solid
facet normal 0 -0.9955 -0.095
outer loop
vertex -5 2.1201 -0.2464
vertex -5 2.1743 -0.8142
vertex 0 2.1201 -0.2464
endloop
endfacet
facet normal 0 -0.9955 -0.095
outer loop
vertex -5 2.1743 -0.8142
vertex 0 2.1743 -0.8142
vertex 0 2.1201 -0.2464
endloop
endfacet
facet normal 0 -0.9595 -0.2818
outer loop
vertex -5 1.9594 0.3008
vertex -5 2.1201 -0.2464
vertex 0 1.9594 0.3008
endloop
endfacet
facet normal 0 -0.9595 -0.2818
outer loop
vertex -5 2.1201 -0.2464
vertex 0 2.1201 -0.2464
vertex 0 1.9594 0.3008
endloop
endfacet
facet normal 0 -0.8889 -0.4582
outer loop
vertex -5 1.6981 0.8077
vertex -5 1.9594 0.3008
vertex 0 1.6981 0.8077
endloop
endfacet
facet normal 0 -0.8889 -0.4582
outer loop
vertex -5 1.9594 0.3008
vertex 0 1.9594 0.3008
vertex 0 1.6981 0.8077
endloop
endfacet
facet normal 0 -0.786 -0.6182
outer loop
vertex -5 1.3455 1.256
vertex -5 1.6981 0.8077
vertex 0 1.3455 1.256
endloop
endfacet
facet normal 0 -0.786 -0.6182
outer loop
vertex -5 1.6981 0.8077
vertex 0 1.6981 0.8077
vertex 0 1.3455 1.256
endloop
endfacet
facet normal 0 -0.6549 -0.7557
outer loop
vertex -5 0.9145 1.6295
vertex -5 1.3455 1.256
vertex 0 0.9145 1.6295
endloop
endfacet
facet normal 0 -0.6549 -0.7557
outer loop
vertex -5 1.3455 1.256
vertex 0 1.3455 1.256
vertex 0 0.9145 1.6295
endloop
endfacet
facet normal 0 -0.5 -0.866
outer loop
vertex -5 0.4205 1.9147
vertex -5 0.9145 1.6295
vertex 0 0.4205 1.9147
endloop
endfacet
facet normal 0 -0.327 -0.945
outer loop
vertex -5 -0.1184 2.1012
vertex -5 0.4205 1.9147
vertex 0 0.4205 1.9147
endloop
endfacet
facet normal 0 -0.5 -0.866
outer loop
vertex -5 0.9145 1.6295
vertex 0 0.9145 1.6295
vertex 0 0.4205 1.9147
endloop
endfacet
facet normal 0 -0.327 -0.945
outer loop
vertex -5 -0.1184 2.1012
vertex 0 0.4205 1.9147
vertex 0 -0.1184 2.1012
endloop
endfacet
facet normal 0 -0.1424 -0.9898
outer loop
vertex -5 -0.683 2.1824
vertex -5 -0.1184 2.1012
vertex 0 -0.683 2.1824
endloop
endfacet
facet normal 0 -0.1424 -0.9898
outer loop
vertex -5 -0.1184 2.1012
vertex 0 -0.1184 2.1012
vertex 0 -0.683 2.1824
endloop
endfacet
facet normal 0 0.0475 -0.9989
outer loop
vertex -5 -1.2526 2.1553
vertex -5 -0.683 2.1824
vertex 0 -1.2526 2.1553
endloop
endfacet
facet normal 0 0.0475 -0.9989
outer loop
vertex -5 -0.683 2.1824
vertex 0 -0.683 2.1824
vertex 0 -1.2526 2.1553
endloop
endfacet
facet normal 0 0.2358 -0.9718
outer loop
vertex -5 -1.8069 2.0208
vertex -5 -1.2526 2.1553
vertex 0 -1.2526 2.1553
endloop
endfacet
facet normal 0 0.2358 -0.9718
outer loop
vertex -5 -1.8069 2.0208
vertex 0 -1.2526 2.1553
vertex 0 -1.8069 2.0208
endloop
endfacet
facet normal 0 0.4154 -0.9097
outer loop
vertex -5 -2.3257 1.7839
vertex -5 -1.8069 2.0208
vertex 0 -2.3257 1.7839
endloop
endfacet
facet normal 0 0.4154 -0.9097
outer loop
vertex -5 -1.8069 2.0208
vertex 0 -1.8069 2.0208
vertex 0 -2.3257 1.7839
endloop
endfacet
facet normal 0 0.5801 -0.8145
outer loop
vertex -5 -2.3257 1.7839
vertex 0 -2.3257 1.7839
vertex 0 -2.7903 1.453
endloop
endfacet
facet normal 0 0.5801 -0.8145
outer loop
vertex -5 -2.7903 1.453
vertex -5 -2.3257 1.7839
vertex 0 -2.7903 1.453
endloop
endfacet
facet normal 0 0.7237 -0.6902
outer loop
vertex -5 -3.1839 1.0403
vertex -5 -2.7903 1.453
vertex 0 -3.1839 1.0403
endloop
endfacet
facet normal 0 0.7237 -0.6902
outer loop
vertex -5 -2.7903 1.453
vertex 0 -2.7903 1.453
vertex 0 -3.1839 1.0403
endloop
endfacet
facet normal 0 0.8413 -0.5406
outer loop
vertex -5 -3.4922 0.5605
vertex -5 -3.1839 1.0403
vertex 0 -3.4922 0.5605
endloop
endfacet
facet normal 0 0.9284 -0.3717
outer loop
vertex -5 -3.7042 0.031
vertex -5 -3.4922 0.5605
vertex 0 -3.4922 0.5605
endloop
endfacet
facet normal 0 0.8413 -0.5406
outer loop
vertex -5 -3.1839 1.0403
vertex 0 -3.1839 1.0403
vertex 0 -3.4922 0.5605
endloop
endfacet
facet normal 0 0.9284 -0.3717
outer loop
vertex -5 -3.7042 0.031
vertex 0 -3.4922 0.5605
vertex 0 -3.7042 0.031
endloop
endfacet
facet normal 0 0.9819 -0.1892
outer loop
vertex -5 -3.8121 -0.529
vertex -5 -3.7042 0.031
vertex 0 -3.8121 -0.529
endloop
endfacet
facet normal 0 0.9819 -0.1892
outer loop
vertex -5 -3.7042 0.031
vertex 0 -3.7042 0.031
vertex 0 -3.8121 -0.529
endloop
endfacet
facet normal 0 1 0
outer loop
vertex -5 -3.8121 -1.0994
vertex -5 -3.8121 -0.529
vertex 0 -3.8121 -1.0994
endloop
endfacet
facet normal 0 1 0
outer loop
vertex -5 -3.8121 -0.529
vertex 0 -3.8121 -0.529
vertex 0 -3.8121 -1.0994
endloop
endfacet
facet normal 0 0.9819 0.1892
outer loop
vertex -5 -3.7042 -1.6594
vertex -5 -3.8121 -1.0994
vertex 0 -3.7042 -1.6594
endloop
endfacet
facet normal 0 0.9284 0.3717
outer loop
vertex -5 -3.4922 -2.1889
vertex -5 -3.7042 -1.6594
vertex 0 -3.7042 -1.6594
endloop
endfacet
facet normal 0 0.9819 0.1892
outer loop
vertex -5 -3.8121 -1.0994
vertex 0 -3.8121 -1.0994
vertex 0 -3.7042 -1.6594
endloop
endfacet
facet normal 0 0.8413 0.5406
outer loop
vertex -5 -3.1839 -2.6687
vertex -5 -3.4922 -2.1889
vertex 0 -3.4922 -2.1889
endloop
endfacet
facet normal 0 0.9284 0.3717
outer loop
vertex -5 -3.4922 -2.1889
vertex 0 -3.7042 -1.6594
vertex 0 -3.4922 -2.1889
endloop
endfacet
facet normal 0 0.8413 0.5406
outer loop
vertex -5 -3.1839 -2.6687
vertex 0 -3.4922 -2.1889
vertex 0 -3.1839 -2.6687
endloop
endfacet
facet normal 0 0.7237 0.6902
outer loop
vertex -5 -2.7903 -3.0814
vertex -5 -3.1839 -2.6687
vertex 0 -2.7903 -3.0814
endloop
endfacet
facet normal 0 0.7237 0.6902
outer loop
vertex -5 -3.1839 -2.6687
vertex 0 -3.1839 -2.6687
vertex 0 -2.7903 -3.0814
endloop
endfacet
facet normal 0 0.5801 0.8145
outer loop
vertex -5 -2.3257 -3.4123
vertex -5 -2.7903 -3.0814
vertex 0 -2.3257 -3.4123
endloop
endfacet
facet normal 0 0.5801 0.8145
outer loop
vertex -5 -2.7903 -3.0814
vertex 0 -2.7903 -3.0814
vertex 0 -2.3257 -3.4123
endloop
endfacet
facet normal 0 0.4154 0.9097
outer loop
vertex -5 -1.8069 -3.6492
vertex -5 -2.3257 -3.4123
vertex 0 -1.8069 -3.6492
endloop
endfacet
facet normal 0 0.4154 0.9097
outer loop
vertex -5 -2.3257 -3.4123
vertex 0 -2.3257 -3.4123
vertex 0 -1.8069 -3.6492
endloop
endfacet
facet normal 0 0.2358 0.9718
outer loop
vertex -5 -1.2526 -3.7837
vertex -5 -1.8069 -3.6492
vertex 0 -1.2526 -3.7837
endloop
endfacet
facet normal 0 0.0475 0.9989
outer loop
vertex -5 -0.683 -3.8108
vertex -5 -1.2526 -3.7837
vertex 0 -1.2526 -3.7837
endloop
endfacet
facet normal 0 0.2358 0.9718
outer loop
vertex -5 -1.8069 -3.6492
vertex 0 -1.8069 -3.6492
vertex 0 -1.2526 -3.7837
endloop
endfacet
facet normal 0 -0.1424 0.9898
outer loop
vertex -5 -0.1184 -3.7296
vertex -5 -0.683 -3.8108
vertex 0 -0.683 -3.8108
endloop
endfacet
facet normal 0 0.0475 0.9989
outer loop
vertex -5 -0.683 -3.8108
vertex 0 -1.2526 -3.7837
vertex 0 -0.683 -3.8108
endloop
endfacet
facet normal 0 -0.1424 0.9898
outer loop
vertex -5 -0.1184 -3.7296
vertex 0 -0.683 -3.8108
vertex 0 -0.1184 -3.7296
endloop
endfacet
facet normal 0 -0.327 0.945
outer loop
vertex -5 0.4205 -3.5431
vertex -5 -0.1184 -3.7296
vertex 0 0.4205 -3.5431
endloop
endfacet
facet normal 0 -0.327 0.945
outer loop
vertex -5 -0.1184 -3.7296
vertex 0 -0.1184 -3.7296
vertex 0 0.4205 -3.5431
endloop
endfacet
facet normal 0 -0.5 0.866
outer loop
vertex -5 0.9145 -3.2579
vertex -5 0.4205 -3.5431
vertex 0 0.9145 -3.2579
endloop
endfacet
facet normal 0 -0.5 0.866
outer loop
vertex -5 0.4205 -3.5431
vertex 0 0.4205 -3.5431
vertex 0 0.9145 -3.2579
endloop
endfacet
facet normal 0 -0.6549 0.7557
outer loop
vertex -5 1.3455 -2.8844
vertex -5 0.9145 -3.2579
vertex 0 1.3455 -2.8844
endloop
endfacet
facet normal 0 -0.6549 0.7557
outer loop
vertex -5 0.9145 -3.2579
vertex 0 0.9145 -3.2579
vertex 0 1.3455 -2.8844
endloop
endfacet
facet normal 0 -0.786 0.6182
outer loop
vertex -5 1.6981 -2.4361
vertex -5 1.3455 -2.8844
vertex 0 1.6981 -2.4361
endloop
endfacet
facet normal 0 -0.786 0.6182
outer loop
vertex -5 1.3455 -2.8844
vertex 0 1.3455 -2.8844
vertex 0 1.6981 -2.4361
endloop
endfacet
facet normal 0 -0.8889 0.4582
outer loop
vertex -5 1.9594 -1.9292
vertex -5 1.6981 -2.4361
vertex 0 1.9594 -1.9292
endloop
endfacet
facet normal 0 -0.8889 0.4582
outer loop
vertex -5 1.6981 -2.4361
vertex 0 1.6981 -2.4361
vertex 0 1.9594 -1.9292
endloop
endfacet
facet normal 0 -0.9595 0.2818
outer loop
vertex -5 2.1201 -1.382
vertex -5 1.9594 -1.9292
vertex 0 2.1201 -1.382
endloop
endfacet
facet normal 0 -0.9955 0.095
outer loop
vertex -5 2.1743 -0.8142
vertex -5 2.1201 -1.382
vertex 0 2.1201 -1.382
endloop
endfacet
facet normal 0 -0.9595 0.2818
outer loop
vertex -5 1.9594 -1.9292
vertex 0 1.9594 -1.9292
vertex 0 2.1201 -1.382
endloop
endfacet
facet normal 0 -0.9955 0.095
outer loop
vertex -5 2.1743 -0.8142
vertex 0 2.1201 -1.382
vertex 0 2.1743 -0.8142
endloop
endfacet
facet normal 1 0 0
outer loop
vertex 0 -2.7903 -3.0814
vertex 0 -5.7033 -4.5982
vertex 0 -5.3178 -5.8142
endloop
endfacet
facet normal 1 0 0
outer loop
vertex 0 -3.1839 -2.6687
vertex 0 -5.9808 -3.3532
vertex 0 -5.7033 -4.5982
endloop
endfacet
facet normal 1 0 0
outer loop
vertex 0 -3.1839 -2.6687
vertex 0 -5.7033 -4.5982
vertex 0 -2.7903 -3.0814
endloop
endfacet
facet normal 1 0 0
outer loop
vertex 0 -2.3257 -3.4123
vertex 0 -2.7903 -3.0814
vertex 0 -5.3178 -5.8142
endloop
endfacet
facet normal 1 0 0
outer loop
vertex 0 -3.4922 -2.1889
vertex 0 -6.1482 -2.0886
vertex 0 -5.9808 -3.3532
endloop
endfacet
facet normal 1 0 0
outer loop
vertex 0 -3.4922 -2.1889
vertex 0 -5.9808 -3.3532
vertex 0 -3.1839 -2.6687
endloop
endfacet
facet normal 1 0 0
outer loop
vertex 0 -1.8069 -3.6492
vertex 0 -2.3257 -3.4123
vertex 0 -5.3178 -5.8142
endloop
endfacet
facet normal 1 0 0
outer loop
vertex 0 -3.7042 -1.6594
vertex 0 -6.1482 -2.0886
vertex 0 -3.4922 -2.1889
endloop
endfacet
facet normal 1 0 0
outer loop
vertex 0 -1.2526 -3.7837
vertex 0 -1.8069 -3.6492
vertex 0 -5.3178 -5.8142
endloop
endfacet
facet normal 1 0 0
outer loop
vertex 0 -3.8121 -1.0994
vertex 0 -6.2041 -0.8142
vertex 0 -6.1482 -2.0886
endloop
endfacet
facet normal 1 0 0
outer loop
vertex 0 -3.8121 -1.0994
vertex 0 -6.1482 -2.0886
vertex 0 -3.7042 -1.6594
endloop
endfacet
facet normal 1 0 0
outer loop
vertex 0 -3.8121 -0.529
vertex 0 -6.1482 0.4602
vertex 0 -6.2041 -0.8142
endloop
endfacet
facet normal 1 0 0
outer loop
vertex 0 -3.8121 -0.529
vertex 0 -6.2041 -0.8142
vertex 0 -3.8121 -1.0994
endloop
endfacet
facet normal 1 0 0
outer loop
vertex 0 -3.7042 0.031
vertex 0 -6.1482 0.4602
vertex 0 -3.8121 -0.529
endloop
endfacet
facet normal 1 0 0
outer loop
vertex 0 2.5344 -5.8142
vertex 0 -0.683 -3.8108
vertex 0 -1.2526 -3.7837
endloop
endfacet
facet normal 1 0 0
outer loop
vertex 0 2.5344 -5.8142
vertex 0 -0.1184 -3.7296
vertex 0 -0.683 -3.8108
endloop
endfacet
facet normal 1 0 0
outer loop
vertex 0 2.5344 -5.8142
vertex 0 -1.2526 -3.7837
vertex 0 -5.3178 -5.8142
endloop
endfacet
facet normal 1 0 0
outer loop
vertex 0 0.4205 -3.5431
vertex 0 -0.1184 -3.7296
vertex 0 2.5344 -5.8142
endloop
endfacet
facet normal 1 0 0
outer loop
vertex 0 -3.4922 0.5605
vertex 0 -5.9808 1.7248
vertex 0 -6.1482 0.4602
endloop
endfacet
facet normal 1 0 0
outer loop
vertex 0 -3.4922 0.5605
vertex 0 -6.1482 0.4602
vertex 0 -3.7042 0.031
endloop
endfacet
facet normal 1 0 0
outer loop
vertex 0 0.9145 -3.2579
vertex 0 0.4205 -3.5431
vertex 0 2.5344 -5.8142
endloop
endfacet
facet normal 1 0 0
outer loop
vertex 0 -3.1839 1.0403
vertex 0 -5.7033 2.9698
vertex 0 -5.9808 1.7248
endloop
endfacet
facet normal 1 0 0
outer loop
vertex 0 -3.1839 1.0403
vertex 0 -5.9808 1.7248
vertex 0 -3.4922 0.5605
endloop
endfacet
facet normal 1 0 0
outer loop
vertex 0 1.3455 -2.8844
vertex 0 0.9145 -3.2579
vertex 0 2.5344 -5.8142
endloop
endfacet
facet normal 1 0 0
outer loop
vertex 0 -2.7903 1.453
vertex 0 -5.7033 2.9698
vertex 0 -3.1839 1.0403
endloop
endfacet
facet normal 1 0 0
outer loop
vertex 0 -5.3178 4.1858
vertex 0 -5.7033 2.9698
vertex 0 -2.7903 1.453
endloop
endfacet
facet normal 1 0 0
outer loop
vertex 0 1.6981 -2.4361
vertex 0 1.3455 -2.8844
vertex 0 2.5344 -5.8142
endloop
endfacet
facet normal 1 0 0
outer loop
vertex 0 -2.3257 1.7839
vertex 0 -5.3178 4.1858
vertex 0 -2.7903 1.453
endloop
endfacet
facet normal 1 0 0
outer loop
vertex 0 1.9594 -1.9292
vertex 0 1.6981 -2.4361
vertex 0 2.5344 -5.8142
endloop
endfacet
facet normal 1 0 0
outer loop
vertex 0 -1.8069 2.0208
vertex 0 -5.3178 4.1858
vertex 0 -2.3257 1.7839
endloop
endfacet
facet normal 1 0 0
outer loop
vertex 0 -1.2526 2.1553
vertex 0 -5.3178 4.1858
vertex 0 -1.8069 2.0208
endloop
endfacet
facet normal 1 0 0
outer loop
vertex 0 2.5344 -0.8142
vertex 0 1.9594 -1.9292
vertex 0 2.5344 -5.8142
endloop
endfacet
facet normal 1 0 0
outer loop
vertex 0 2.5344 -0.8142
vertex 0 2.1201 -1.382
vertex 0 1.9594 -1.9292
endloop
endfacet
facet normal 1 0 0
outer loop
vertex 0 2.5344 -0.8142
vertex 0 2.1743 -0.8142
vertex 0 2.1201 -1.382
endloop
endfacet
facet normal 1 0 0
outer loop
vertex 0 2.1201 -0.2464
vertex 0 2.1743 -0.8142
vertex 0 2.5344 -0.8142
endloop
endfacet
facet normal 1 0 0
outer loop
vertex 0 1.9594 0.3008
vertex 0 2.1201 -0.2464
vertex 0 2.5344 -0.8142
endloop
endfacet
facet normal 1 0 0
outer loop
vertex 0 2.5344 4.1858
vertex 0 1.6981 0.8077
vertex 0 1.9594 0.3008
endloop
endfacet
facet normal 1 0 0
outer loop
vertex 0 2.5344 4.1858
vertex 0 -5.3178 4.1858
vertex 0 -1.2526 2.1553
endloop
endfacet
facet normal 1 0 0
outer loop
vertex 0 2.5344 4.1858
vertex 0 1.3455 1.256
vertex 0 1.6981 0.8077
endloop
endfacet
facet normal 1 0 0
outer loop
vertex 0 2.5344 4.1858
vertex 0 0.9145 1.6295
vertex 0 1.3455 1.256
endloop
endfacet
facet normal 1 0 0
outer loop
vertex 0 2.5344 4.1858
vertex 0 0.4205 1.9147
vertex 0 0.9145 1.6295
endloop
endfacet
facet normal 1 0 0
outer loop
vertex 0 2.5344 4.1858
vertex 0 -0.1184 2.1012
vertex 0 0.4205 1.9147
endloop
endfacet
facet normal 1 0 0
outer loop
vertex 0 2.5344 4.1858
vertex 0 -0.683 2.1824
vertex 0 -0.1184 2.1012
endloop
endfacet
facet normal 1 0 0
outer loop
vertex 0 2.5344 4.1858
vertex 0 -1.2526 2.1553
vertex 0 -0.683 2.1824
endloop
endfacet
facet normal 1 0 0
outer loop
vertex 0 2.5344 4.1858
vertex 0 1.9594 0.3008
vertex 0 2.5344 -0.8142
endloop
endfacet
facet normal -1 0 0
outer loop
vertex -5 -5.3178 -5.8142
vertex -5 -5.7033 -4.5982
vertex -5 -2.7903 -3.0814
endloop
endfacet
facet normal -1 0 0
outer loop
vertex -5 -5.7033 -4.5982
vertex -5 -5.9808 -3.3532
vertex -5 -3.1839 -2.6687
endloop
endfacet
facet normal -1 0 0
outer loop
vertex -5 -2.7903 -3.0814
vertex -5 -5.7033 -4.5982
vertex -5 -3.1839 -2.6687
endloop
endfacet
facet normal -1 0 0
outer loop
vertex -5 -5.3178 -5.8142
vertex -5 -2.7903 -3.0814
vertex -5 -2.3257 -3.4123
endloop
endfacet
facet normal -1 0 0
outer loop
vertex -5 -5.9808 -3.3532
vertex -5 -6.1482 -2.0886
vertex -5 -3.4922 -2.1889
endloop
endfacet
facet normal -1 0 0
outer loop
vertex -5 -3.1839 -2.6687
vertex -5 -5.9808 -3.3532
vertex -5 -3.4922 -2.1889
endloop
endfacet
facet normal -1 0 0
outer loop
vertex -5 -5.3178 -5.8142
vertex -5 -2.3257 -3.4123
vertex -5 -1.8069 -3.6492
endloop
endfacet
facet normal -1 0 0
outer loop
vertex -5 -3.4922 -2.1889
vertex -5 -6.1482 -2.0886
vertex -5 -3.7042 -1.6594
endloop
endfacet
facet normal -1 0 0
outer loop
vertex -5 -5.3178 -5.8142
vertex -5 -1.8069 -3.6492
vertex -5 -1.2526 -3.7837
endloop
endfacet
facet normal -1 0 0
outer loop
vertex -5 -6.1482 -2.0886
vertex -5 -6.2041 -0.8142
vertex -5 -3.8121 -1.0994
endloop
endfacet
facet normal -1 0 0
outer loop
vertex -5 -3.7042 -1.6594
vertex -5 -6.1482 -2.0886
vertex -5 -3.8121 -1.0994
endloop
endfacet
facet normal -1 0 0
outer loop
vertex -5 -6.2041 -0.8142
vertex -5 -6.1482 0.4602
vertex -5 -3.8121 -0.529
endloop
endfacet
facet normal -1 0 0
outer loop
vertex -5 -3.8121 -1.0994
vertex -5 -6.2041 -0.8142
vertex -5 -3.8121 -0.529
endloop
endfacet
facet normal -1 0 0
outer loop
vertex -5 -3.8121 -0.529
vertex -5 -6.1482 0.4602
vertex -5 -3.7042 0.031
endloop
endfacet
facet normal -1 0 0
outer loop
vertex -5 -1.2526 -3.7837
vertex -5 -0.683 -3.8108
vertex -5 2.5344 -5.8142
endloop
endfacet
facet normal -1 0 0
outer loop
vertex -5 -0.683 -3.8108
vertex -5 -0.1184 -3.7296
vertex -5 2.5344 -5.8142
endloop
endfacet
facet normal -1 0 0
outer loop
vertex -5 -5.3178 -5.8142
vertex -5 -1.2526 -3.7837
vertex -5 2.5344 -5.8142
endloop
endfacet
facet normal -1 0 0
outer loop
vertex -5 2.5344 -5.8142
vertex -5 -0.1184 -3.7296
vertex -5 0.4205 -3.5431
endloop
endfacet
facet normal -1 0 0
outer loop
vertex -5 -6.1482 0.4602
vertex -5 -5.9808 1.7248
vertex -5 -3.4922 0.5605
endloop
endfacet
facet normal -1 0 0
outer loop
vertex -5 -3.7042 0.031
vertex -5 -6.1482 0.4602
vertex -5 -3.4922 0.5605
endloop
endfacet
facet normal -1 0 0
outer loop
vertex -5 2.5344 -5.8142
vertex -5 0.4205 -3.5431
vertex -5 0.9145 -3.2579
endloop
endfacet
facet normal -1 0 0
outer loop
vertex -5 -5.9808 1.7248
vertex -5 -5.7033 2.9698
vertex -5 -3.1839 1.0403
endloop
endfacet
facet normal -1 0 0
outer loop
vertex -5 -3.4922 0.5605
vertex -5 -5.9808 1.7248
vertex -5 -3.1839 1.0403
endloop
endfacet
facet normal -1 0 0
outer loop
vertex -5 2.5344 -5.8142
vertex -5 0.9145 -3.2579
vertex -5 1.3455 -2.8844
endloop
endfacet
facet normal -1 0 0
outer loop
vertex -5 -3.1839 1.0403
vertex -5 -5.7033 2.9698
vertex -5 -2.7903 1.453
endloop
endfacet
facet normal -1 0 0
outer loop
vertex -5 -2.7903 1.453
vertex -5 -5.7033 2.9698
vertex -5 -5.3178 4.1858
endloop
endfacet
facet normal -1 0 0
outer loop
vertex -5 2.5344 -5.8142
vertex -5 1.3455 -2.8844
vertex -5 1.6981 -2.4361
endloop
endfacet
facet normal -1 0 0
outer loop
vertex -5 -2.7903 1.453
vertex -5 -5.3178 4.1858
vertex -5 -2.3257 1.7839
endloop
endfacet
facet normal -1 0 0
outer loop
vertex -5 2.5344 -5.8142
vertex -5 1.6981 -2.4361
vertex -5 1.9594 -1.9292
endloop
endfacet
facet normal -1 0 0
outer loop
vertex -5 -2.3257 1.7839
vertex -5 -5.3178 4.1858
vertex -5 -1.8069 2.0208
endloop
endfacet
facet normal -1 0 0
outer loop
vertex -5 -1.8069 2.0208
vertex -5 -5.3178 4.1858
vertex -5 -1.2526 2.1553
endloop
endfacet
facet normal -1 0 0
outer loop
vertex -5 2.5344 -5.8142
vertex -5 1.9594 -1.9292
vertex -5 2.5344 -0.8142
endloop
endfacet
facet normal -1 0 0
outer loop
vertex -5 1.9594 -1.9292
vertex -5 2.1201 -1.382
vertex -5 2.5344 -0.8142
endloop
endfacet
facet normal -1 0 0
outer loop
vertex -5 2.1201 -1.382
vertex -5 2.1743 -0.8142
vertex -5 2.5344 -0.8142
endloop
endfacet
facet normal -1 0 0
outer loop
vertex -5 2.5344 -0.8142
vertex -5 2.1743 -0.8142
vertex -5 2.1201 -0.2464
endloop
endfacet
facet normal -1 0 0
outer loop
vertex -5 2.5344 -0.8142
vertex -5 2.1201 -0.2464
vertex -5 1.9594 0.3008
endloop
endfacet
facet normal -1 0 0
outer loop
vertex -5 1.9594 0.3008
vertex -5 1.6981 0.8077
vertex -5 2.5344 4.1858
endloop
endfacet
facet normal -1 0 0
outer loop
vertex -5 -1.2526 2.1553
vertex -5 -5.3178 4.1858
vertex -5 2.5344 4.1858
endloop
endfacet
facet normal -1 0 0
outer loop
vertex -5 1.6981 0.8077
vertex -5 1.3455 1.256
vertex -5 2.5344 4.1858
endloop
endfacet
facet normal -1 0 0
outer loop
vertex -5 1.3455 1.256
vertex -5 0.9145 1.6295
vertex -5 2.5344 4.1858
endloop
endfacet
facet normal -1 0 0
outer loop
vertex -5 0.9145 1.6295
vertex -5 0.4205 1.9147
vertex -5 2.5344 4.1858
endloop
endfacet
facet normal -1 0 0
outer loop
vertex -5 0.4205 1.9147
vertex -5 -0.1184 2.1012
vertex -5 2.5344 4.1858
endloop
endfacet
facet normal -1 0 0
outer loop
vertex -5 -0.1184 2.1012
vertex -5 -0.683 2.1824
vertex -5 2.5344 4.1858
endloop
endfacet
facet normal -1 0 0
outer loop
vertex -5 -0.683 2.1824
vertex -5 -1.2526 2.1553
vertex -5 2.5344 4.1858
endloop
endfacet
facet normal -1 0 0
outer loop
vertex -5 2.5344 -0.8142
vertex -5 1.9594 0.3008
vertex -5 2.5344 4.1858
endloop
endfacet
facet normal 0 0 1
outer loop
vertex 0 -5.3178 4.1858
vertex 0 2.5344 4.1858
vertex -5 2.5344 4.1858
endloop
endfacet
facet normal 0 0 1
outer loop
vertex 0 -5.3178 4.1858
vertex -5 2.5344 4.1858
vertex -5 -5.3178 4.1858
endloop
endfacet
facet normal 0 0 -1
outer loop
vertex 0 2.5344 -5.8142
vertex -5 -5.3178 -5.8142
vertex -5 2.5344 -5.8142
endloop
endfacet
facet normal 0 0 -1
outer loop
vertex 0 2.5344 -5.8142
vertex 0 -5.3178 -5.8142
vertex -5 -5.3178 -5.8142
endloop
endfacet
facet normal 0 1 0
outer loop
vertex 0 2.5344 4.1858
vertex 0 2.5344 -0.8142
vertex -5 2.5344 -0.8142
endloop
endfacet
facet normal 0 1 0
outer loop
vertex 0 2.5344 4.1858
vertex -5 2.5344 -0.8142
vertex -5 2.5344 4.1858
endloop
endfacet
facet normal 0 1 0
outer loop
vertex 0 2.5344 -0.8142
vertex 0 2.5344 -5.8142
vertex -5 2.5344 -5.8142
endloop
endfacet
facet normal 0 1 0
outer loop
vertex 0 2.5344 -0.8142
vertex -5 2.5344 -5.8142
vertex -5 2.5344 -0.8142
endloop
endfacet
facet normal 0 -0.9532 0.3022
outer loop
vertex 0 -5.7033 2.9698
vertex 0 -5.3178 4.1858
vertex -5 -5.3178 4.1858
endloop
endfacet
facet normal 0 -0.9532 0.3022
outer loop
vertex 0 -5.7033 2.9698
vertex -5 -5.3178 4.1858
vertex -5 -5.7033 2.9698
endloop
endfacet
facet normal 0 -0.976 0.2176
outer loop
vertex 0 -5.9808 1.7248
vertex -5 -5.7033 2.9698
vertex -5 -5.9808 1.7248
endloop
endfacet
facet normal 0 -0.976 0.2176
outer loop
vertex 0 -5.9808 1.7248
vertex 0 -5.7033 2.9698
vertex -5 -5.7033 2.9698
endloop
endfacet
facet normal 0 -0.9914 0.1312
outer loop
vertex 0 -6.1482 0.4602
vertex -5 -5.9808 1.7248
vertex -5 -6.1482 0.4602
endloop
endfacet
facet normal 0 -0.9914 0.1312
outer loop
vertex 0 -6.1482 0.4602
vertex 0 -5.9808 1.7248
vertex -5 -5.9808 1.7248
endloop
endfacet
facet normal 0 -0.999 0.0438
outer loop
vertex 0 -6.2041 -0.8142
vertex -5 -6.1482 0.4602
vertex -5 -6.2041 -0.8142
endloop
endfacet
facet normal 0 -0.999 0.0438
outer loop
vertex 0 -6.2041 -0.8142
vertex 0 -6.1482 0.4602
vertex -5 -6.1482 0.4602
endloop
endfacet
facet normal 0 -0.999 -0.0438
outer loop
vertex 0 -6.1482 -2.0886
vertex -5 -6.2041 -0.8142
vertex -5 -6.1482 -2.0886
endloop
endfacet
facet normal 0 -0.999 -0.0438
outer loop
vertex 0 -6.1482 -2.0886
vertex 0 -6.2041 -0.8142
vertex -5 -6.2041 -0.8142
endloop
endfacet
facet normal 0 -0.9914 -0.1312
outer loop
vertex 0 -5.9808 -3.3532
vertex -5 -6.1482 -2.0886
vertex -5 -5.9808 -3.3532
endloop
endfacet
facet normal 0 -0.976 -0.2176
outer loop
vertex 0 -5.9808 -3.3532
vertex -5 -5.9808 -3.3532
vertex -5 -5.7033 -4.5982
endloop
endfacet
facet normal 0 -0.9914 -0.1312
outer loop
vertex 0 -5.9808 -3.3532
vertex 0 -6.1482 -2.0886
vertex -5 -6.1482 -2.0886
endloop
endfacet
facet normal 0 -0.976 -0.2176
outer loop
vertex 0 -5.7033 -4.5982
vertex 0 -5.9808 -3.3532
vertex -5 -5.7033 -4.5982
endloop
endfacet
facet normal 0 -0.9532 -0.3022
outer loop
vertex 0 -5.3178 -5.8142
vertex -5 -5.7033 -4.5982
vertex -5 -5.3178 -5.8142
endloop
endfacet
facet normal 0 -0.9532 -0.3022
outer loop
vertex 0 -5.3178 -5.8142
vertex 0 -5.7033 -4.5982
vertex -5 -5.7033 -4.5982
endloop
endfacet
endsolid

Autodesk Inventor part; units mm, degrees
ref_plane "YZ Plane" through (0, 0, 0) normal (1, 0, 0) x (0, 1, 0)
ref_plane "XZ Plane" through (0, 0, 0) normal (0, 1, 0) x (-1, 0, 0)
ref_plane "XY Plane" through (0, 0, 0) normal (0, 0, 1) x (1, 0, 0)
sketch "Schizzo1" plane through (0, 0, 0) normal (1, 0, 0) x (0, 1, 0)
  line L0 (2.5344, 4.1858) -> (-5.3178, 4.1858)
  line L1 (-5.3178, -5.8142) -> (2.5344, -5.8142)
  line L2 (2.5344, -5.8142) -> (2.5344, 4.1858)
  circle A0 centre (-0.8257, -0.8142) radius 3
  line L3 (2.5344, 4.1858) -> (2.5344, -0.8142)
  arc A1 (-5.3178, 4.1858) -> (-5.3178, -5.8142) centre (8.3421, -0.8142) ccw
  point P0 (0, 0)
  dimension "d0" = 10
  dimension "d1" = 6
extrude "Estrusione1" add sketch "Schizzo1" against normal blind 5
thread "Filettatura1" size "M6x0.75" class "6H" standard "ANSI Metric M Profile" full length
properties part number "porta vite senza fine"
